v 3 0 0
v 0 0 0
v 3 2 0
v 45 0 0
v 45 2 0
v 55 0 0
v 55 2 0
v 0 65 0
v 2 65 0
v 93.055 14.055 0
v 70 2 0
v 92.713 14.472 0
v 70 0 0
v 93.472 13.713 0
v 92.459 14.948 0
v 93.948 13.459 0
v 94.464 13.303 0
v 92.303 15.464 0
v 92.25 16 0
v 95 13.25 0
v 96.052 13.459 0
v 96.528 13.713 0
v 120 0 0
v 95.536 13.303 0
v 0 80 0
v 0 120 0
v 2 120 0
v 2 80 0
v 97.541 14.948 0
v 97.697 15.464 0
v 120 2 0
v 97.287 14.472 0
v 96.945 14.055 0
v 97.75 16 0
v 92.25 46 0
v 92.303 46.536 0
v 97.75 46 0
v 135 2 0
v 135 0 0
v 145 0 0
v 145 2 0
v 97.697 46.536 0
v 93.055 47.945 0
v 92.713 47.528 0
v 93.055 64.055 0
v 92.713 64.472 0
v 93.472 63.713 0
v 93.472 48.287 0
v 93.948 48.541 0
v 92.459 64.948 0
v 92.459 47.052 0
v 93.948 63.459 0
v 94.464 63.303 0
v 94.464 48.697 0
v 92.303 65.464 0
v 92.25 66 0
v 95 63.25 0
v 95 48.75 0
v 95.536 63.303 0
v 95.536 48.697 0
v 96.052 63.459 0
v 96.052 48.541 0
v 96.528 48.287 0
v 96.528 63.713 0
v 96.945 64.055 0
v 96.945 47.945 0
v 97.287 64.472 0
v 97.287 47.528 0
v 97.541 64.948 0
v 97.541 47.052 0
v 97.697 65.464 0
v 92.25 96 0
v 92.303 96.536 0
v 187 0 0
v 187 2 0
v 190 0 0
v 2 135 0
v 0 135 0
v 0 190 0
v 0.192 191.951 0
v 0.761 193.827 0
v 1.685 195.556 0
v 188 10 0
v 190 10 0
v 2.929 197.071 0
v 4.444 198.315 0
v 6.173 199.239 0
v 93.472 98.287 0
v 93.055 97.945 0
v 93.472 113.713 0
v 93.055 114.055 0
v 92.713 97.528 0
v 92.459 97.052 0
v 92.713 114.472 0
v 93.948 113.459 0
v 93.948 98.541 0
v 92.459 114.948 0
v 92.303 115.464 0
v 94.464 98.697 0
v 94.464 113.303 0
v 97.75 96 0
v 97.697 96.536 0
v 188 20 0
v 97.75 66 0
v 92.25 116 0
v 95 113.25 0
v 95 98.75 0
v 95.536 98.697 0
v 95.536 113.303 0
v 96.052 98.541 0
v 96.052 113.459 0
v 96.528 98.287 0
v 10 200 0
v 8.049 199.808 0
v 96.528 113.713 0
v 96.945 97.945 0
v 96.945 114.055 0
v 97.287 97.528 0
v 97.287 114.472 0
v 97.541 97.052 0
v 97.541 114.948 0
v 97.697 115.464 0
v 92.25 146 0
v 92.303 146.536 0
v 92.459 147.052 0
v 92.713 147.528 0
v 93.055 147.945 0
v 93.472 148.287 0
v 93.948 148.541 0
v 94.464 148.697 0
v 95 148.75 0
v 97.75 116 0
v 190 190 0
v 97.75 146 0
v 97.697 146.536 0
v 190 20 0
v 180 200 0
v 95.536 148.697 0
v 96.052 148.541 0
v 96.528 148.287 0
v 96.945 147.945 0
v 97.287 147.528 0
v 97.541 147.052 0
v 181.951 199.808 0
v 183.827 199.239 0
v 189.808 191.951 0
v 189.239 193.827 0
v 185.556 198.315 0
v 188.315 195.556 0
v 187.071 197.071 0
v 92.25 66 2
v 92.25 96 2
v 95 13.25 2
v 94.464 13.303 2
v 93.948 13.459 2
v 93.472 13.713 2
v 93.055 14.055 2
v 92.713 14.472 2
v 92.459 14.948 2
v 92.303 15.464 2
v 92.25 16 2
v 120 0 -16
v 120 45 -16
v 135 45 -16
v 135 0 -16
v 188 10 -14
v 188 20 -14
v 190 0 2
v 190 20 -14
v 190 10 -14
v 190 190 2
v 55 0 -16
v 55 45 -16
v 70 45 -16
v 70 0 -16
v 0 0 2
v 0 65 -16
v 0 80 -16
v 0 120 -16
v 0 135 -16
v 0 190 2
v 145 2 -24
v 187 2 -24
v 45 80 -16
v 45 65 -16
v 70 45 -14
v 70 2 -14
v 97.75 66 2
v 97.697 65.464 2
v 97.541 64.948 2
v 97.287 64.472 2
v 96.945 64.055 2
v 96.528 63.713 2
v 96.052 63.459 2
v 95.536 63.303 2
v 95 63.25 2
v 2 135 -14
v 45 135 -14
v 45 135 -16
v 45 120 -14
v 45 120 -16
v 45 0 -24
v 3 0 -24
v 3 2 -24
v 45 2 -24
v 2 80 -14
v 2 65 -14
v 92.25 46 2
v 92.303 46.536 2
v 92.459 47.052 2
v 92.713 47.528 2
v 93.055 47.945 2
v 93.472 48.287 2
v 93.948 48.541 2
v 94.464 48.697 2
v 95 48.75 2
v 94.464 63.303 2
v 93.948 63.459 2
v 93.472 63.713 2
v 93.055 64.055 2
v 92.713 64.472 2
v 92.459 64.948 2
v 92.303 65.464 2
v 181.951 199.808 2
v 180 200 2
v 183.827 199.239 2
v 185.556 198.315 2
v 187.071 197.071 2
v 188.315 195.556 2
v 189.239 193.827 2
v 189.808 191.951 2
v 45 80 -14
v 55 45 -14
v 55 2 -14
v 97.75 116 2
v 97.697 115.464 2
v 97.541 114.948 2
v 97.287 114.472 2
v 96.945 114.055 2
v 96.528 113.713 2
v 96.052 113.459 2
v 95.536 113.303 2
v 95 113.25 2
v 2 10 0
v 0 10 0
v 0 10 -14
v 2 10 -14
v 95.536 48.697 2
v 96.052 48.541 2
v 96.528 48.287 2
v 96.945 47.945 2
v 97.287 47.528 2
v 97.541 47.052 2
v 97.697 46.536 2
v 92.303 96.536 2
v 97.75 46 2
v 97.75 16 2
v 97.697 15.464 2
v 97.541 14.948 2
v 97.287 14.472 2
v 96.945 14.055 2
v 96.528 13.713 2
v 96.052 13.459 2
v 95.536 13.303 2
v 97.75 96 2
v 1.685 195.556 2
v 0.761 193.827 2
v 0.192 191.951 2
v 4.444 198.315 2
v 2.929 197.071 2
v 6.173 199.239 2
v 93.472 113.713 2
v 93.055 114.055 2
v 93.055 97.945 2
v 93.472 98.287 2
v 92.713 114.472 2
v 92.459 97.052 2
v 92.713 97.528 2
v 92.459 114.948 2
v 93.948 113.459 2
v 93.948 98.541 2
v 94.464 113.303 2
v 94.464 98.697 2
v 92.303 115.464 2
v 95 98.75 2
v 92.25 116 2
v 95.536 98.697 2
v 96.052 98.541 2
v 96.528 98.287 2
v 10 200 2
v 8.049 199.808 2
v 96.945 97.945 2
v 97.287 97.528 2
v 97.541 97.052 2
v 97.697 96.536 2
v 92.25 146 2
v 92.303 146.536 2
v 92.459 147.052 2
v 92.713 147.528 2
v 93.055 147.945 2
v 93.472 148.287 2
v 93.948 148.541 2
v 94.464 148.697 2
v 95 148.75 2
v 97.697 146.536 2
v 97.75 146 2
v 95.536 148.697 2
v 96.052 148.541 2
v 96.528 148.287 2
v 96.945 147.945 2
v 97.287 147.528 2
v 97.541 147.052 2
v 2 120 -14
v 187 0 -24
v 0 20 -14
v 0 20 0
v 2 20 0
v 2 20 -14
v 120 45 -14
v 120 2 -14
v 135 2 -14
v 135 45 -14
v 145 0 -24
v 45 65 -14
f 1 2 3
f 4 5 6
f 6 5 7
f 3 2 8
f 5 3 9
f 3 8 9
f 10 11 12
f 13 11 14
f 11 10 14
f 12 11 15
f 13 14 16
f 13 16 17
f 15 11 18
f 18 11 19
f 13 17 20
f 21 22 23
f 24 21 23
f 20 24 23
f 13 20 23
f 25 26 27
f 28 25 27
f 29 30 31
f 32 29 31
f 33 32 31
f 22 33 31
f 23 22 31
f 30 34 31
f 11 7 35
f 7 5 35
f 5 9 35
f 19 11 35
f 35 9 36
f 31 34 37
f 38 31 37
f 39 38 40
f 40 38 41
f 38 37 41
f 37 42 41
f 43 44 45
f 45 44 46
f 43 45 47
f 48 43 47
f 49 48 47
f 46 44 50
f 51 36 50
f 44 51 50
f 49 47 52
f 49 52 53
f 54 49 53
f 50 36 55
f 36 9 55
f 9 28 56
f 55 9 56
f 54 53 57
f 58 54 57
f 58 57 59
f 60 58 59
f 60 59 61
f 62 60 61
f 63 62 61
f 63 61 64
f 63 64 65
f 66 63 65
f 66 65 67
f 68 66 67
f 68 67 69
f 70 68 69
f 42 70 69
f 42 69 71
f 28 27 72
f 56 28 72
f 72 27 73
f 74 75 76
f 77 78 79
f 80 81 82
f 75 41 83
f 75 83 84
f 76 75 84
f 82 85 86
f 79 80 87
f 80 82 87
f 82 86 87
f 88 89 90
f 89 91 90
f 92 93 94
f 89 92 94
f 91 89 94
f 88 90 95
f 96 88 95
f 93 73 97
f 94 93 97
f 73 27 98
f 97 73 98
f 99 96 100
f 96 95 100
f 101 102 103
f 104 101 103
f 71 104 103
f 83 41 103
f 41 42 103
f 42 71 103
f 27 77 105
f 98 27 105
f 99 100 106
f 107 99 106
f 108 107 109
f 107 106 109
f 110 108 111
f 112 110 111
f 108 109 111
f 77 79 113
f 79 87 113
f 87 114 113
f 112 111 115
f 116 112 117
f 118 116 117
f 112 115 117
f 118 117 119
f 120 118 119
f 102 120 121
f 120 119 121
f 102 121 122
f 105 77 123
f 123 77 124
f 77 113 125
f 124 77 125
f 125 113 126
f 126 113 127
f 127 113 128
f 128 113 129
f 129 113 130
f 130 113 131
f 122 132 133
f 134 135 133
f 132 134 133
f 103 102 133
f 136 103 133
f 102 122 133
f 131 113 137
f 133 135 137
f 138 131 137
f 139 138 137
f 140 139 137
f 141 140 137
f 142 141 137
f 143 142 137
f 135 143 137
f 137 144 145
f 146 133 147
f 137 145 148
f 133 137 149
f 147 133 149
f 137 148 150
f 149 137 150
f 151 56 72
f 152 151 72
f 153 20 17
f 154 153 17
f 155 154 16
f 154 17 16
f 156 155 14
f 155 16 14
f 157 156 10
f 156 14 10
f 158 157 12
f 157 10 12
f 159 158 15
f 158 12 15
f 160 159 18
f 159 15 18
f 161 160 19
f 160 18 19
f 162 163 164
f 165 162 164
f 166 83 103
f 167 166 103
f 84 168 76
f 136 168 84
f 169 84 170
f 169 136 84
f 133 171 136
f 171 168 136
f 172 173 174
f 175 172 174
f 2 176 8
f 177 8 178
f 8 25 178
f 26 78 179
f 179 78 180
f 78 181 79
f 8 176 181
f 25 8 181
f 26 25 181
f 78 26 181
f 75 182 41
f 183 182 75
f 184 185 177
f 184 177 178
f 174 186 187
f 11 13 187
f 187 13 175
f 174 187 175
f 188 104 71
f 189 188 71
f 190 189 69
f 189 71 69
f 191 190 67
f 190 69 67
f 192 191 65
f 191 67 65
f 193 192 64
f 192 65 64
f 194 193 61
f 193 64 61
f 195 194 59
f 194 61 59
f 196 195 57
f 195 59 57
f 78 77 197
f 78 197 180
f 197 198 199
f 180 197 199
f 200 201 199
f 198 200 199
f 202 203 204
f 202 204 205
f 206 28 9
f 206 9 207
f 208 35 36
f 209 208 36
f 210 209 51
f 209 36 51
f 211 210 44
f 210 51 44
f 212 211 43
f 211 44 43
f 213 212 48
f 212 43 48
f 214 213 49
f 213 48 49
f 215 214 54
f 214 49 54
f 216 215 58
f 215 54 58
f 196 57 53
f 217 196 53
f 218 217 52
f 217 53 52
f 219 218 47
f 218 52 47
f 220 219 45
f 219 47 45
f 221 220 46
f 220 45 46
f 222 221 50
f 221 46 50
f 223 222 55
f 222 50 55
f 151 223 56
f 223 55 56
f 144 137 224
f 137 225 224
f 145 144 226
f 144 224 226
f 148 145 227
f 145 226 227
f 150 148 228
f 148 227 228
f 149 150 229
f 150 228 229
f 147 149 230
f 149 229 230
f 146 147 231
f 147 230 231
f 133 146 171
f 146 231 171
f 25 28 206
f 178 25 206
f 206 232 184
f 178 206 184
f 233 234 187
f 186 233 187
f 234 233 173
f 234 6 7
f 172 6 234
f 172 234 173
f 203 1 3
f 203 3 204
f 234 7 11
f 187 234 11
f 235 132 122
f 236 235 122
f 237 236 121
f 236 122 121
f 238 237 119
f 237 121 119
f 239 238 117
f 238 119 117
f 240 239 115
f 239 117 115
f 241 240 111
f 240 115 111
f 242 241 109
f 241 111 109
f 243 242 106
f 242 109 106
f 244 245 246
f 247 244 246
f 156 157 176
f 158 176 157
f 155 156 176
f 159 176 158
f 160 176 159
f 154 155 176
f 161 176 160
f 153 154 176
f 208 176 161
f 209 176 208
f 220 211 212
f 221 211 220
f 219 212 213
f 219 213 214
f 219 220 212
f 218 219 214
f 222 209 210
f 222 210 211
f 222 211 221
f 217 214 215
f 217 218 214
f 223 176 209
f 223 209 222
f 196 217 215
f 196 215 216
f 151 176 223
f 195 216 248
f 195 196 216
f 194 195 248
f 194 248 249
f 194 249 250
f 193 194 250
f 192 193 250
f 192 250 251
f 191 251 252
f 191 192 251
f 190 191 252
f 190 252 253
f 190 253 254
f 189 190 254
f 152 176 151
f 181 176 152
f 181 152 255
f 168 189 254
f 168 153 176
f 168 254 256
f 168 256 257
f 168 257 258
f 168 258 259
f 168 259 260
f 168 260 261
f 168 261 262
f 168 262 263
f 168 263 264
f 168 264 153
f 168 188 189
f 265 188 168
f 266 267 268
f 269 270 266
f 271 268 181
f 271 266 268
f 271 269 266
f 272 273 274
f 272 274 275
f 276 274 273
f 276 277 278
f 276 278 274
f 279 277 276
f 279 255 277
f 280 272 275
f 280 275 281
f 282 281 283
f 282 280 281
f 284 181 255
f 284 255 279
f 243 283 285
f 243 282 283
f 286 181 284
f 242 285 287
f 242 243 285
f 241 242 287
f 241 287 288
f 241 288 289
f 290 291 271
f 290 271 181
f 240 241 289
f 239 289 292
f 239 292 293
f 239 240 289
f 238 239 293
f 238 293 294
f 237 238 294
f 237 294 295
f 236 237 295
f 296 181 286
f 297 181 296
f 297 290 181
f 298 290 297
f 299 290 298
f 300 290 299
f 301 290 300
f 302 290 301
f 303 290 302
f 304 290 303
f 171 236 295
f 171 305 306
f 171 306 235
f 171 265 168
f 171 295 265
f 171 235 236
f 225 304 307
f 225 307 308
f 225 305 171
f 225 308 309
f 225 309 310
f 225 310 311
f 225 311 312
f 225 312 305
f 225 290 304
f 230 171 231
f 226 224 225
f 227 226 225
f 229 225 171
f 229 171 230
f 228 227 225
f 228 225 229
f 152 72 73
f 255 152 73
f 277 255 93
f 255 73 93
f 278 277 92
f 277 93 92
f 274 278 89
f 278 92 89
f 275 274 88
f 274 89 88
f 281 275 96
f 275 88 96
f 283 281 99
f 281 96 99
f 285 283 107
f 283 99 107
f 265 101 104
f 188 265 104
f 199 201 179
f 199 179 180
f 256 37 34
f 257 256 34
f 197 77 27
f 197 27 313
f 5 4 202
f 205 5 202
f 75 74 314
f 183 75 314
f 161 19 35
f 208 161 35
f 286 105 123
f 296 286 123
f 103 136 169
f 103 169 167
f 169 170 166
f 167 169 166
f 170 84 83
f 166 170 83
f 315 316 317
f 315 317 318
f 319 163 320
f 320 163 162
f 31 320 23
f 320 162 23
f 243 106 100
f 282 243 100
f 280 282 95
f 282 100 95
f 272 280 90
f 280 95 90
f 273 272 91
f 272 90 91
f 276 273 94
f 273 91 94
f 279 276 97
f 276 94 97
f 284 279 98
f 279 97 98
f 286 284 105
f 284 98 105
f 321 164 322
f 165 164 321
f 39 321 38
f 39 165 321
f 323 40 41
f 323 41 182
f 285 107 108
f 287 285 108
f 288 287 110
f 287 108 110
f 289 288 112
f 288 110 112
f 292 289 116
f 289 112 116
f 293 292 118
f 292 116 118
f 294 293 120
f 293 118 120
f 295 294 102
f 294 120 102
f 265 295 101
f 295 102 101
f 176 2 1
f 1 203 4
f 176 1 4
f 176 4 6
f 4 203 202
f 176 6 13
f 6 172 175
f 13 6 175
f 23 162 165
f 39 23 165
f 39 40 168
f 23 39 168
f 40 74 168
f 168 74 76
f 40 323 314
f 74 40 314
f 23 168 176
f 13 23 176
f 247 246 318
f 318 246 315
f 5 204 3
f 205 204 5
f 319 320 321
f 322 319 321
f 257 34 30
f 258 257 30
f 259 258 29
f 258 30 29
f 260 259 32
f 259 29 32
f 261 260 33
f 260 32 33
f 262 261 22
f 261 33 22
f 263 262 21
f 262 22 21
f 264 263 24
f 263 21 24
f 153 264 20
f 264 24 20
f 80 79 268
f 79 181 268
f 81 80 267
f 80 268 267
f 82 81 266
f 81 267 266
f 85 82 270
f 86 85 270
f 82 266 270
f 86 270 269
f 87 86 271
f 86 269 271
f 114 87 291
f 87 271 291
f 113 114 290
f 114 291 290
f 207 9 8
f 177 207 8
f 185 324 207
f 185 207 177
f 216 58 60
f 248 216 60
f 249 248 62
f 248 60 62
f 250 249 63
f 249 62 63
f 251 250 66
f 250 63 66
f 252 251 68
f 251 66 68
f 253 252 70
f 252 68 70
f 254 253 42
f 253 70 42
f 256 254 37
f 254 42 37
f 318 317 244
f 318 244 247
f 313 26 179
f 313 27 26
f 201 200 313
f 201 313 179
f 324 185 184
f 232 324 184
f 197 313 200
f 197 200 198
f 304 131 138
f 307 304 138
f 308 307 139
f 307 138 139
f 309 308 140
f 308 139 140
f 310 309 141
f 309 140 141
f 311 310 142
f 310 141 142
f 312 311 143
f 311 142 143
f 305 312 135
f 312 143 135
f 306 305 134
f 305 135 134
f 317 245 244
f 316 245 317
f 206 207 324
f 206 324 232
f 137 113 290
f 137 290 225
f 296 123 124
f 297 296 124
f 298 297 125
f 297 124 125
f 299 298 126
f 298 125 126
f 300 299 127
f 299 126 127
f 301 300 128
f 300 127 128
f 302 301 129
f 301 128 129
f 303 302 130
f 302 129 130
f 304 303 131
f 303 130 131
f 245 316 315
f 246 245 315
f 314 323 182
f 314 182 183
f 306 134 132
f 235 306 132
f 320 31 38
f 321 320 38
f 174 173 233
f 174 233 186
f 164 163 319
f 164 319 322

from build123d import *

# Parameters (mm, degrees)
SKETCH_1_W          = 190
SKETCH_1_H          = 200
EXTRUDE_1_DEPTH     = 2
SKETCH_2_W          = 42
SKETCH_2_H          = 24
EXTRUDE_2_DEPTH     = 2
SKETCH_12_W         = 14
SKETCH_12_H         = 10
EXTRUDE_5_DEPTH     = 2
SKETCH_15_W         = 14
SKETCH_15_H         = 15
EXTRUDE_9_DEPTH     = 2
SKETCH_15_3_W       = 2
SKETCH_15_3_H       = 15
EXTRUDE_10_DEPTH    = 190
CUT_EXTRUDE_1_DEPTH = 20
FILLET_1_R          = 10
SKETCH_20_W         = 14
SKETCH_20_H         = 125
CUT_EXTRUDE_4_DEPTH = 10
SKETCH_21_W         = 145
SKETCH_21_H         = 70
CUT_EXTRUDE_5_DEPTH = 2
SKETCH_22_W         = 2
SKETCH_22_H         = 10
EXTRUDE_11_DEPTH    = 14
SKETCH_23_W         = 15
SKETCH_23_H         = 16
EXTRUDE_12_DEPTH    = 2
SKETCH_25_W         = 15
SKETCH_25_H         = 2
EXTRUDE_13_DEPTH    = 43


with BuildPart() as part:
    # 草图1 → 凸台-拉伸1 (new body)
    with BuildSketch(Plane.XY):
        with Locations((95, 100)):
            Rectangle(SKETCH_1_W, SKETCH_1_H)
    extrude(amount=EXTRUDE_1_DEPTH)

    # 草图2 → 凸台-拉伸2 (add)
    with BuildSketch(Plane(origin=(0, 0, 0), x_dir=(1, 0, 0), z_dir=(0, 1, 0))):
        with Locations((24, 12)):
            Rectangle(SKETCH_2_W, SKETCH_2_H)
        with Locations((166, 12)):
            Rectangle(SKETCH_2_W, SKETCH_2_H)
    extrude(amount=EXTRUDE_2_DEPTH)

    # 草图15 → 凸台-拉伸9 (add)
    with BuildSketch(Plane(origin=(0, 0, 0), x_dir=(0, 0, -1), z_dir=(1, 0, 0))):
        with Locations((7, 127.5)):
            Rectangle(SKETCH_15_W, SKETCH_15_H)
        with Locations((7, 72.5)):
            Rectangle(SKETCH_15_W, SKETCH_15_H)
    extrude_9 = extrude(amount=EXTRUDE_9_DEPTH)

    # 草图15<3> → 凸台-拉伸10 (add)
    with BuildSketch(Plane(origin=(0, 0, 0), x_dir=(0, 0, -1), z_dir=(1, 0, 0))):
        with Locations((15, 127.5)):
            Rectangle(SKETCH_15_3_W, SKETCH_15_3_H)
        with Locations((15, 72.5)):
            Rectangle(SKETCH_15_3_W, SKETCH_15_3_H)
    extrude_10 = extrude(amount=EXTRUDE_10_DEPTH)

    # 草图17 → 切除-拉伸1 (cut)
    with BuildSketch(Plane(origin=(0, 0, 0), x_dir=(-1, 0, 0), z_dir=(0, 0, -1))):
        with BuildLine():
            Line((-95, 146), (-95, 116))
            Line((-95, 116), (-95, 113.25))
            ThreePointArc((-95, 113.25), (-93.055456352, 114.055456352), (-92.25, 116))
            Line((-92.25, 116), (-92.25, 146))
            ThreePointArc((-92.25, 146), (-93.055456352, 147.944543648), (-95, 148.75))
            Line((-95, 148.75), (-95, 146))
        make_face()
        with BuildLine():
            Line((-95, 113.25), (-95, 116))
            Line((-95, 116), (-95, 146))
            Line((-95, 146), (-95, 148.75))
            ThreePointArc((-95, 148.75), (-96.944543648, 147.944543648), (-97.75, 146))
            Line((-97.75, 146), (-97.75, 116))
            ThreePointArc((-97.75, 116), (-96.944543648, 114.055456352), (-95, 113.25))
        make_face()
        with BuildLine():
            Line((-95, 63.25), (-95, 98.75))
            ThreePointArc((-95, 98.75), (-96.944543648, 97.944543648), (-97.75, 96))
            Line((-97.75, 96), (-97.75, 66))
            ThreePointArc((-97.75, 66), (-96.944543648, 64.055456352), (-95, 63.25))
        make_face()
        with BuildLine():
            Line((-95, 13.25), (-95, 48.75))
            ThreePointArc((-95, 48.75), (-96.944543648, 47.944543648), (-97.75, 46))
            Line((-97.75, 46), (-97.75, 16))
            ThreePointArc((-97.75, 16), (-96.944543648, 14.055456352), (-95, 13.25))
        make_face()
        with BuildLine():
            ThreePointArc((-92.25, 46), (-93.055456352, 47.944543648), (-95, 48.75))
            Line((-95, 48.75), (-95, 13.25))
            ThreePointArc((-95, 13.25), (-93.055456352, 14.055456352), (-92.25, 16))
            Line((-92.25, 16), (-92.25, 46))
        make_face()
        with BuildLine():
            ThreePointArc((-92.25, 96), (-93.055456352, 97.944543648), (-95, 98.75))
            Line((-95, 98.75), (-95, 63.25))
            ThreePointArc((-95, 63.25), (-93.055456352, 64.055456352), (-92.25, 66))
            Line((-92.25, 66), (-92.25, 96))
        make_face()
    extrude(amount=-CUT_EXTRUDE_1_DEPTH, mode=Mode.SUBTRACT)

    # 圆角1
    fillet_1_edges = [part.edges().sort_by_distance(p)[0] for p in [
        (0, 200, 1),
        (190, 200, 1),
    ]]
    fillet(fillet_1_edges, radius=FILLET_1_R)

    # 镜向18: 凸台-拉伸9, 凸台-拉伸10 across plane
    add(extrude_9.mirror(Plane(origin=(95, 0, 0), x_dir=(0, 0, 1), z_dir=(1, 0, 0))))
    add(extrude_10.mirror(Plane(origin=(95, 0, 0), x_dir=(0, 0, 1), z_dir=(1, 0, 0))))


with BuildPart() as body_2:
    # 草图12 → 凸台-拉伸5 (new body)
    with BuildSketch(Plane(origin=(0, 0, 0), x_dir=(0, 0, -1), z_dir=(1, 0, 0))):
        with Locations((7, 15)):
            Rectangle(SKETCH_12_W, SKETCH_12_H)
    extrude_5 = extrude(amount=EXTRUDE_5_DEPTH)


with BuildPart() as part_1:
    add(part.part)

    # 镜向19: 凸台-拉伸5 across plane
    add(extrude_5.mirror(Plane(origin=(95, 0, 0), x_dir=(0, 0, 1), z_dir=(1, 0, 0))))

    # 草图20 → 切除-拉伸4 (cut)
    with BuildSketch(Plane(origin=(190, 0, 0), x_dir=(0, 0, -1), z_dir=(1, 0, 0))):
        with Locations((7, 72.5)):
            Rectangle(SKETCH_20_W, SKETCH_20_H)
    extrude(amount=-CUT_EXTRUDE_4_DEPTH, mode=Mode.SUBTRACT)

    # 草图21 → 切除-拉伸5 (cut)
    with BuildSketch(Plane(origin=(0, 0, -16), x_dir=(-1, 0, 0), z_dir=(0, 0, -1))):
        with Locations((-117.5, 100)):
            Rectangle(SKETCH_21_W, SKETCH_21_H)
    extrude(amount=-CUT_EXTRUDE_5_DEPTH, mode=Mode.SUBTRACT)

    # 草图22 → 凸台-拉伸11 (add)
    with BuildSketch(Plane(origin=(0, 0, 0), x_dir=(-1, 0, 0), z_dir=(0, 0, -1))):
        with Locations((-189, 15)):
            Rectangle(SKETCH_22_W, SKETCH_22_H)
    extrude(amount=EXTRUDE_11_DEPTH)

    # 草图23 → 凸台-拉伸12 (add)
    with BuildSketch(Plane.XZ):
        with Locations((62.5, -8)):
            Rectangle(SKETCH_23_W, SKETCH_23_H)
        with Locations((127.5, -8)):
            Rectangle(SKETCH_23_W, SKETCH_23_H)
    extrude(amount=-EXTRUDE_12_DEPTH)

    # 草图25 → 凸台-拉伸13 (add)
    with BuildSketch(Plane(origin=(0, 2, 0), x_dir=(1, 0, 0), z_dir=(0, 1, 0))):
        with Locations((62.5, 15)):
            Rectangle(SKETCH_25_W, SKETCH_25_H)
        with Locations((127.5, 15)):
            Rectangle(SKETCH_25_W, SKETCH_25_H)
    extrude(amount=EXTRUDE_13_DEPTH)


solid = Compound([body_2.part, part_1.part])
